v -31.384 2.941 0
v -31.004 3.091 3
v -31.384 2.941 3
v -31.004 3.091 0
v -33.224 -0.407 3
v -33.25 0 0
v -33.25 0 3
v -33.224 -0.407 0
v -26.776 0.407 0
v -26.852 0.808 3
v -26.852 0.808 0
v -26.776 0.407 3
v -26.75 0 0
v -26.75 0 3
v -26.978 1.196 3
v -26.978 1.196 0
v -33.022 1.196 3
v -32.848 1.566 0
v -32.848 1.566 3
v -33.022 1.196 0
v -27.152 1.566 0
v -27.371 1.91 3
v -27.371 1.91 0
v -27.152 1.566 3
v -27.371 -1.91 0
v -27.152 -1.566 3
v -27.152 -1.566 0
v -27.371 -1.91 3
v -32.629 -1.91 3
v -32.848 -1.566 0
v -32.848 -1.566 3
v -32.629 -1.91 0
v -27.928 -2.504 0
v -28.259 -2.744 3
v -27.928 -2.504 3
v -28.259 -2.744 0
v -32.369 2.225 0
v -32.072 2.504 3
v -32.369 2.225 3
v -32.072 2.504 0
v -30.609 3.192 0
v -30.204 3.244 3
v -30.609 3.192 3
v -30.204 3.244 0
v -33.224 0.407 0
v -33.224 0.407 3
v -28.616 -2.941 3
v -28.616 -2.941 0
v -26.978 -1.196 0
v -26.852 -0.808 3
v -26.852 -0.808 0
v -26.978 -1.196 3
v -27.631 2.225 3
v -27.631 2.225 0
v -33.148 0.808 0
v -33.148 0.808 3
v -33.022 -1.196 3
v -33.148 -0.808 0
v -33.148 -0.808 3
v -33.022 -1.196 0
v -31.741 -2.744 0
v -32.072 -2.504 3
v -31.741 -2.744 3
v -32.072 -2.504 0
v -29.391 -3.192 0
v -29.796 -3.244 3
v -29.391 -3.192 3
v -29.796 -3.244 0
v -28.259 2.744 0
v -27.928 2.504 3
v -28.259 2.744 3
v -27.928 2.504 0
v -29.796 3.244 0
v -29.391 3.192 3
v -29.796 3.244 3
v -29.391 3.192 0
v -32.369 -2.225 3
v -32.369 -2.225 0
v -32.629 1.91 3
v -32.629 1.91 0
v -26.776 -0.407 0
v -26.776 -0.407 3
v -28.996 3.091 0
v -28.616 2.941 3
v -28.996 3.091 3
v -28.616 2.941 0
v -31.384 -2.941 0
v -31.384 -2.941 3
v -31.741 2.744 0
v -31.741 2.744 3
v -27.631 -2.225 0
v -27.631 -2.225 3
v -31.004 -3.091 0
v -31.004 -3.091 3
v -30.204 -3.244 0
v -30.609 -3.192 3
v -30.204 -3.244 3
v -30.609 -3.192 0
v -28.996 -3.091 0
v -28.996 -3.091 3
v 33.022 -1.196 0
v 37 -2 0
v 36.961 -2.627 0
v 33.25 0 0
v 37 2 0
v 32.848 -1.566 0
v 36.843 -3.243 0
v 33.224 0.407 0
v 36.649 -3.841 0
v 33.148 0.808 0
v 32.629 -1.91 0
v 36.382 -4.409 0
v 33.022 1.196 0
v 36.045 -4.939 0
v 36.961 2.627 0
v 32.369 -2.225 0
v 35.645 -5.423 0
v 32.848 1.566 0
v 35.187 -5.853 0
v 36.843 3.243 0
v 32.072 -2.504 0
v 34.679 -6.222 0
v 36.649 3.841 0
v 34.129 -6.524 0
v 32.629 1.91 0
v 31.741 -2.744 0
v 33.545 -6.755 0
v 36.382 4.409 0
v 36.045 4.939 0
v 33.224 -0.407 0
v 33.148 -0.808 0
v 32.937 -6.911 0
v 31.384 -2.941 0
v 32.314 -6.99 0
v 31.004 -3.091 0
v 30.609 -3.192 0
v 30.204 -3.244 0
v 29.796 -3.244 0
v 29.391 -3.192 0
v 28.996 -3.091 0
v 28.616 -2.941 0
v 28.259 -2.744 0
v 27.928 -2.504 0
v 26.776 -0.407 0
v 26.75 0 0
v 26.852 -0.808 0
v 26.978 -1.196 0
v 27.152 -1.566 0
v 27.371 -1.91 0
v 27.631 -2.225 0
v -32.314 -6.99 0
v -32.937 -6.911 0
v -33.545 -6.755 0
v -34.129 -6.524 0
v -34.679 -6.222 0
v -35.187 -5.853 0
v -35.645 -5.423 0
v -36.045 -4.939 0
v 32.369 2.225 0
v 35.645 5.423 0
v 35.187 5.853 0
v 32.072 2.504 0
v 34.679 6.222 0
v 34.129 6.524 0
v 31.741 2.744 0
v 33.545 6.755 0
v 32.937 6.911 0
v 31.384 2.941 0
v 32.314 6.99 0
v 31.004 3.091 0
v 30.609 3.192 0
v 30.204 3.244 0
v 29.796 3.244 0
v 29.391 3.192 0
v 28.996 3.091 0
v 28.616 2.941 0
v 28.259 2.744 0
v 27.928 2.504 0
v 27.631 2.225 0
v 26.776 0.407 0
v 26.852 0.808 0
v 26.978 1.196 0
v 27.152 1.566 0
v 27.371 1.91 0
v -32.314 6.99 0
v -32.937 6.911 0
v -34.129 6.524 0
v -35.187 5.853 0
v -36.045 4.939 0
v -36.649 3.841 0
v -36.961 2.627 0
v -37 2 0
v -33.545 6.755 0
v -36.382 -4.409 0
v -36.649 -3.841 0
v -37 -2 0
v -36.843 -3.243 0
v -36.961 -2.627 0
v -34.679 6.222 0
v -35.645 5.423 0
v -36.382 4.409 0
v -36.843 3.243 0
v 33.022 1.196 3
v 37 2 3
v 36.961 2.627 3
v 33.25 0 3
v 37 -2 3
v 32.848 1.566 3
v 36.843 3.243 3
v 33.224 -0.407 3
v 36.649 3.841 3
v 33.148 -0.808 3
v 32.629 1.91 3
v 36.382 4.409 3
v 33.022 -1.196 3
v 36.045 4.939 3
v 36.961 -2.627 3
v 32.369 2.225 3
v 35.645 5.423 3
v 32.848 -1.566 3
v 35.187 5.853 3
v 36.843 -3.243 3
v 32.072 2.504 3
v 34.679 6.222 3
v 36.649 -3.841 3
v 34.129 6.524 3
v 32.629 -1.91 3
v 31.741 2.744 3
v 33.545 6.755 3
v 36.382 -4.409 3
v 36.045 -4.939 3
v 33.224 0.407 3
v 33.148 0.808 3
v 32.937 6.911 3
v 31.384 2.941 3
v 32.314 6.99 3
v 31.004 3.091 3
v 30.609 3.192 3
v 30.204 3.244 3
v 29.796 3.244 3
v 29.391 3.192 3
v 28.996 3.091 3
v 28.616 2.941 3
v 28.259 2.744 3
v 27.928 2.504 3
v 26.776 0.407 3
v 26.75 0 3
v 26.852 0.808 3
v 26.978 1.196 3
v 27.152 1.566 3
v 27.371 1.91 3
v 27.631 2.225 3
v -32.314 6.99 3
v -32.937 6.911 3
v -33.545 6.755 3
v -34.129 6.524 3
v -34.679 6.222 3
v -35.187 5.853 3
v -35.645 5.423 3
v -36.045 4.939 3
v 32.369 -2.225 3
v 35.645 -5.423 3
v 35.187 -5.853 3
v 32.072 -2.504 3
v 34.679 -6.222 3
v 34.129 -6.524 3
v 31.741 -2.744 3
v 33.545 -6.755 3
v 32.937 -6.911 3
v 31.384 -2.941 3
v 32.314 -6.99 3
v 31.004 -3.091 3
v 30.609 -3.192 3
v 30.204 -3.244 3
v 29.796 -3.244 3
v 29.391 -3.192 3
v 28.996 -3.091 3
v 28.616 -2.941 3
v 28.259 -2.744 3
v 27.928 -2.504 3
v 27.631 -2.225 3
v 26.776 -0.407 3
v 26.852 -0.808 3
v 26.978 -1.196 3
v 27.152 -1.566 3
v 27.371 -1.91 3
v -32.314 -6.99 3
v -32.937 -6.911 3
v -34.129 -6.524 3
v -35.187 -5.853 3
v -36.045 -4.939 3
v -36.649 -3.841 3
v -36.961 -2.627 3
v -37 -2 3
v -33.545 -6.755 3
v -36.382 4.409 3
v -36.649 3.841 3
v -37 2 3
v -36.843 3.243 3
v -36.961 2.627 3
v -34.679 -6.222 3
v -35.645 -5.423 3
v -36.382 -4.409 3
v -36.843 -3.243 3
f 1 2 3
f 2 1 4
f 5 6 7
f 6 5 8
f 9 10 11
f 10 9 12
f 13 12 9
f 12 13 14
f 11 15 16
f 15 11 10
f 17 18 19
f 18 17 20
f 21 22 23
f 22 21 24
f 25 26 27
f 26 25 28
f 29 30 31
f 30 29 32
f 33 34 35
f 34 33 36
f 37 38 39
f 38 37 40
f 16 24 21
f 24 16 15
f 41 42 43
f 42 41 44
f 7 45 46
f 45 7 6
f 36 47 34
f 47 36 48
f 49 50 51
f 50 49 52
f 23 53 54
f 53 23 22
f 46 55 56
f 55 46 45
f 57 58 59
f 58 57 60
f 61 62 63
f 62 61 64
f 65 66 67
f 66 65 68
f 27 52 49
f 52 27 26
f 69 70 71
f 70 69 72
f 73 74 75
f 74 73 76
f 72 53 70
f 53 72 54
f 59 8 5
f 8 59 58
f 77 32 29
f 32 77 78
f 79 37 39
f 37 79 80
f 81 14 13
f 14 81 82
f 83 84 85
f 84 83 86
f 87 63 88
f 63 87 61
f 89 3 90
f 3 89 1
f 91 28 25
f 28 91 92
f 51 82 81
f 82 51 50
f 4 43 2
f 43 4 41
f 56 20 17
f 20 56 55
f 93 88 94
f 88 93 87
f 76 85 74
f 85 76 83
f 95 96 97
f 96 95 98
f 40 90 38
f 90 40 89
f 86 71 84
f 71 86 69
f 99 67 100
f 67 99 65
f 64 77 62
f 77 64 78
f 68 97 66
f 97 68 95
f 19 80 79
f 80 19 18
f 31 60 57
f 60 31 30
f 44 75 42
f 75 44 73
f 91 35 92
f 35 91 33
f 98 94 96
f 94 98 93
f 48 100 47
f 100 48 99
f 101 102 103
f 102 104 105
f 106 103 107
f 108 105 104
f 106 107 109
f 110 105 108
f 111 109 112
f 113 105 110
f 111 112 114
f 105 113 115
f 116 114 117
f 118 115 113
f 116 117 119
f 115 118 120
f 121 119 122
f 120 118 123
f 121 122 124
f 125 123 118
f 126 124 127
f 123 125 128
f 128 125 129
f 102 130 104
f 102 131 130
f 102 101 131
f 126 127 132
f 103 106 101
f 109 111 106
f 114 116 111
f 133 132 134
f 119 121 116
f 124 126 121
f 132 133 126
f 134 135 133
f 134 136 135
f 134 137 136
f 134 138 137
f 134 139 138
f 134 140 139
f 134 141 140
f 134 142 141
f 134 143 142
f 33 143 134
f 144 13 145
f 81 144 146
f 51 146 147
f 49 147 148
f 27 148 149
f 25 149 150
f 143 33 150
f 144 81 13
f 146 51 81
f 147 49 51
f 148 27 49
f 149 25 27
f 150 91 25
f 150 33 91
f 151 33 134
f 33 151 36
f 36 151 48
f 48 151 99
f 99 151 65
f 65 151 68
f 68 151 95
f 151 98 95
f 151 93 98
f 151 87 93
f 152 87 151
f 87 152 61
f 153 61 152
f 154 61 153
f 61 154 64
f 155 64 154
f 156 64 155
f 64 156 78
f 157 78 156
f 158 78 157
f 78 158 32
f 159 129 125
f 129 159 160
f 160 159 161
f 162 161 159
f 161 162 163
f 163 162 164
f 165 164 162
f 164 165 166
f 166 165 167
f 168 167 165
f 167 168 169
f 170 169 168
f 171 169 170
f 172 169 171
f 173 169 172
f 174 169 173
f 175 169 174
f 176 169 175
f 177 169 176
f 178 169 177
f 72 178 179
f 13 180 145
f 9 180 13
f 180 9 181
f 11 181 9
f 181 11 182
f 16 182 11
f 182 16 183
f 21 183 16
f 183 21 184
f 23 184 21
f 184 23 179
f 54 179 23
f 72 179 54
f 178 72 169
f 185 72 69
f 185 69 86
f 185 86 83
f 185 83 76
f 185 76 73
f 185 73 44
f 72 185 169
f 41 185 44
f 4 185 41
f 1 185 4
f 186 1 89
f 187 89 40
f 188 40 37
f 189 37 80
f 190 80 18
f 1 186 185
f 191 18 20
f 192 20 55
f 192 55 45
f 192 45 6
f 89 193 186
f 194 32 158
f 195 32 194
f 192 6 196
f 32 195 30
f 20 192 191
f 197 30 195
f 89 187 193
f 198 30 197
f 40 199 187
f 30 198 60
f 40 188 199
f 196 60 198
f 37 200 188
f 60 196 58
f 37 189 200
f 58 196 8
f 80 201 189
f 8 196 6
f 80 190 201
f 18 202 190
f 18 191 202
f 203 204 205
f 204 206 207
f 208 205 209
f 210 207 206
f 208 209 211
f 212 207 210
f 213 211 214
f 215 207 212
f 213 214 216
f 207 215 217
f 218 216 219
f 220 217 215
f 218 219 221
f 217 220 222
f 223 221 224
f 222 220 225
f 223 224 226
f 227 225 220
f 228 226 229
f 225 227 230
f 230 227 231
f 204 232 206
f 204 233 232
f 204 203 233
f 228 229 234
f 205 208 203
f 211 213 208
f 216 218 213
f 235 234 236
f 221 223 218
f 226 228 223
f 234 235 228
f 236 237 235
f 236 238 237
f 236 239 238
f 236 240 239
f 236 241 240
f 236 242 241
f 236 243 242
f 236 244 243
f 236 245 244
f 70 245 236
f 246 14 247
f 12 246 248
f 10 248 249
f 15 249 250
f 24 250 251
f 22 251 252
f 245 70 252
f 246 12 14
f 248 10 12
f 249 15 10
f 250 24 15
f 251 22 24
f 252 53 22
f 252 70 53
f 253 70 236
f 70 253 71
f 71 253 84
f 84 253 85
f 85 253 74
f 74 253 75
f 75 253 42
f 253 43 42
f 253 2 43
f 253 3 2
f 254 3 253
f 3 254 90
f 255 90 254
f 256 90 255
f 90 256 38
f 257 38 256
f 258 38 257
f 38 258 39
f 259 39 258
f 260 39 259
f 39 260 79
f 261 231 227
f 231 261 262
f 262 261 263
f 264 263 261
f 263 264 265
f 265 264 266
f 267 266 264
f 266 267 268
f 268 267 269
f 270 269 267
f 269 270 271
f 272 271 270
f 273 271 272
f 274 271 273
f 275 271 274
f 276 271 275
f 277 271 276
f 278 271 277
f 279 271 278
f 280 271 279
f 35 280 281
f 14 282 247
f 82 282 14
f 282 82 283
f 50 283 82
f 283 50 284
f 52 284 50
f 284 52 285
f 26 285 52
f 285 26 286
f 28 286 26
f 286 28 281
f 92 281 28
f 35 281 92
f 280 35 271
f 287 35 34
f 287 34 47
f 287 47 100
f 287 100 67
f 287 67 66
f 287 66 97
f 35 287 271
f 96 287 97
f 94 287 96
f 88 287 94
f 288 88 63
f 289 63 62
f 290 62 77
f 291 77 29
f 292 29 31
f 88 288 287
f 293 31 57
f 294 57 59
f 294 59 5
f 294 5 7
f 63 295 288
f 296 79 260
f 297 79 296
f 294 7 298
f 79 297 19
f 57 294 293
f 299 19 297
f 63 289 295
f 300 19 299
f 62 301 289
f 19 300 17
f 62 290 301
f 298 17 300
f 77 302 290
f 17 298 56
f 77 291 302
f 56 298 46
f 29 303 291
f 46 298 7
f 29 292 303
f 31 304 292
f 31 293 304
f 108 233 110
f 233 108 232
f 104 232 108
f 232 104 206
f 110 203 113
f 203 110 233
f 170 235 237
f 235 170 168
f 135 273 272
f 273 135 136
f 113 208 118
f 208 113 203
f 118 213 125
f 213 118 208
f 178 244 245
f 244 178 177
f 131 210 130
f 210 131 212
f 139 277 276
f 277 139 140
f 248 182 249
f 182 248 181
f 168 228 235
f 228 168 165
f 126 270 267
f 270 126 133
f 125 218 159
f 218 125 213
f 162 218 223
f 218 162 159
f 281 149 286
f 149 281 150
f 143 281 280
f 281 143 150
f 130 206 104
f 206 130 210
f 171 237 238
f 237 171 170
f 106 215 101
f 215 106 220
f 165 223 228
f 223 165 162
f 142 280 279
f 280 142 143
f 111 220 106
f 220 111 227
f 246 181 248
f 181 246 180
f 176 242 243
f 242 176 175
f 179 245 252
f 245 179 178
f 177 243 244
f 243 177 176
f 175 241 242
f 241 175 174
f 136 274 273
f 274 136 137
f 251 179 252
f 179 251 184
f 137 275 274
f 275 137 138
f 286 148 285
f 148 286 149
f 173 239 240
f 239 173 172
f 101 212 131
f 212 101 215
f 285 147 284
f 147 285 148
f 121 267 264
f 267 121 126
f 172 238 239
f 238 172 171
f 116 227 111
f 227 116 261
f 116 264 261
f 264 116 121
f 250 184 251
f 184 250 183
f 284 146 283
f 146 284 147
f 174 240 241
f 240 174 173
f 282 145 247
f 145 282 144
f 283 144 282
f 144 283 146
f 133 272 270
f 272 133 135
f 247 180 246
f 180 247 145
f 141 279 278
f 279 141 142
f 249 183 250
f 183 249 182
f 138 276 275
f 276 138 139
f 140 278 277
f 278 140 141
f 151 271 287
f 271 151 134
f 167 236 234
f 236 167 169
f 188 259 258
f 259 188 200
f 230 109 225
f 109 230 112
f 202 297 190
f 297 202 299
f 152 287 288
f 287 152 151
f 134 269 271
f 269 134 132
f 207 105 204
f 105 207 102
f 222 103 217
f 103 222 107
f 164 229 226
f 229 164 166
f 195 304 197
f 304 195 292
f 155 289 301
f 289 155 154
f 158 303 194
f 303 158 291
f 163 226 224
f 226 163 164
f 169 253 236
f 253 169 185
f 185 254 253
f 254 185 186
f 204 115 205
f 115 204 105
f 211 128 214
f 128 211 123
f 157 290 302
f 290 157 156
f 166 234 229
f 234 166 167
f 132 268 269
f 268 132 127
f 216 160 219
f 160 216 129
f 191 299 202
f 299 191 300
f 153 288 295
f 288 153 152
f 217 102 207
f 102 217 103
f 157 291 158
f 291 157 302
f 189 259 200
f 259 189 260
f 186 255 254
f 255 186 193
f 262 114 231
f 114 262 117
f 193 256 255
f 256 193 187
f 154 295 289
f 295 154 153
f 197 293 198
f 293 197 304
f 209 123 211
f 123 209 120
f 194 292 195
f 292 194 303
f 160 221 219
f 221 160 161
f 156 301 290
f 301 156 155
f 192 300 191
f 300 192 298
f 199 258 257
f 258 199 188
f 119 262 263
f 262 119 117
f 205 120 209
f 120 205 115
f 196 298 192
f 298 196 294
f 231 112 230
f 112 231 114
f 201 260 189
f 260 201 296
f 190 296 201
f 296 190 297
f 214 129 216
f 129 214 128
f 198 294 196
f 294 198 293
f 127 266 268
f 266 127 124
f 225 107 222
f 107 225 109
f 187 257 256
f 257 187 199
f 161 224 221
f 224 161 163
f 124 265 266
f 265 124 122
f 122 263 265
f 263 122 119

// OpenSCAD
$fn = 50;


difference() {
	union() {
		hull() {
			translate(v = [-32.0000000000, 2.0000000000, 0]) {
				cylinder(h = 3, r = 5);
			}
			translate(v = [32.0000000000, 2.0000000000, 0]) {
				cylinder(h = 3, r = 5);
			}
			translate(v = [-32.0000000000, -2.0000000000, 0]) {
				cylinder(h = 3, r = 5);
			}
			translate(v = [32.0000000000, -2.0000000000, 0]) {
				cylinder(h = 3, r = 5);
			}
		}
	}
	union() {
		translate(v = [-30.0000000000, 0.0000000000, 0]) {
			cylinder(h = 3, r = 3.2500000000);
		}
		translate(v = [30.0000000000, 0.0000000000, 0]) {
			cylinder(h = 3, r = 3.2500000000);
		}
		translate(v = [-30.0000000000, 0.0000000000, 0]) {
			cylinder(h = 3, r = 1.8000000000);
		}
		translate(v = [30.0000000000, 0.0000000000, 0]) {
			cylinder(h = 3, r = 1.8000000000);
		}
		translate(v = [-30.0000000000, 0.0000000000, 0]) {
			cylinder(h = 3, r = 1.8000000000);
		}
		translate(v = [30.0000000000, 0.0000000000, 0]) {
			cylinder(h = 3, r = 1.8000000000);
		}
		translate(v = [-30.0000000000, 0.0000000000, 0]) {
			cylinder(h = 3, r = 1.8000000000);
		}
		translate(v = [30.0000000000, 0.0000000000, 0]) {
			cylinder(h = 3, r = 1.8000000000);
		}
	}
}
